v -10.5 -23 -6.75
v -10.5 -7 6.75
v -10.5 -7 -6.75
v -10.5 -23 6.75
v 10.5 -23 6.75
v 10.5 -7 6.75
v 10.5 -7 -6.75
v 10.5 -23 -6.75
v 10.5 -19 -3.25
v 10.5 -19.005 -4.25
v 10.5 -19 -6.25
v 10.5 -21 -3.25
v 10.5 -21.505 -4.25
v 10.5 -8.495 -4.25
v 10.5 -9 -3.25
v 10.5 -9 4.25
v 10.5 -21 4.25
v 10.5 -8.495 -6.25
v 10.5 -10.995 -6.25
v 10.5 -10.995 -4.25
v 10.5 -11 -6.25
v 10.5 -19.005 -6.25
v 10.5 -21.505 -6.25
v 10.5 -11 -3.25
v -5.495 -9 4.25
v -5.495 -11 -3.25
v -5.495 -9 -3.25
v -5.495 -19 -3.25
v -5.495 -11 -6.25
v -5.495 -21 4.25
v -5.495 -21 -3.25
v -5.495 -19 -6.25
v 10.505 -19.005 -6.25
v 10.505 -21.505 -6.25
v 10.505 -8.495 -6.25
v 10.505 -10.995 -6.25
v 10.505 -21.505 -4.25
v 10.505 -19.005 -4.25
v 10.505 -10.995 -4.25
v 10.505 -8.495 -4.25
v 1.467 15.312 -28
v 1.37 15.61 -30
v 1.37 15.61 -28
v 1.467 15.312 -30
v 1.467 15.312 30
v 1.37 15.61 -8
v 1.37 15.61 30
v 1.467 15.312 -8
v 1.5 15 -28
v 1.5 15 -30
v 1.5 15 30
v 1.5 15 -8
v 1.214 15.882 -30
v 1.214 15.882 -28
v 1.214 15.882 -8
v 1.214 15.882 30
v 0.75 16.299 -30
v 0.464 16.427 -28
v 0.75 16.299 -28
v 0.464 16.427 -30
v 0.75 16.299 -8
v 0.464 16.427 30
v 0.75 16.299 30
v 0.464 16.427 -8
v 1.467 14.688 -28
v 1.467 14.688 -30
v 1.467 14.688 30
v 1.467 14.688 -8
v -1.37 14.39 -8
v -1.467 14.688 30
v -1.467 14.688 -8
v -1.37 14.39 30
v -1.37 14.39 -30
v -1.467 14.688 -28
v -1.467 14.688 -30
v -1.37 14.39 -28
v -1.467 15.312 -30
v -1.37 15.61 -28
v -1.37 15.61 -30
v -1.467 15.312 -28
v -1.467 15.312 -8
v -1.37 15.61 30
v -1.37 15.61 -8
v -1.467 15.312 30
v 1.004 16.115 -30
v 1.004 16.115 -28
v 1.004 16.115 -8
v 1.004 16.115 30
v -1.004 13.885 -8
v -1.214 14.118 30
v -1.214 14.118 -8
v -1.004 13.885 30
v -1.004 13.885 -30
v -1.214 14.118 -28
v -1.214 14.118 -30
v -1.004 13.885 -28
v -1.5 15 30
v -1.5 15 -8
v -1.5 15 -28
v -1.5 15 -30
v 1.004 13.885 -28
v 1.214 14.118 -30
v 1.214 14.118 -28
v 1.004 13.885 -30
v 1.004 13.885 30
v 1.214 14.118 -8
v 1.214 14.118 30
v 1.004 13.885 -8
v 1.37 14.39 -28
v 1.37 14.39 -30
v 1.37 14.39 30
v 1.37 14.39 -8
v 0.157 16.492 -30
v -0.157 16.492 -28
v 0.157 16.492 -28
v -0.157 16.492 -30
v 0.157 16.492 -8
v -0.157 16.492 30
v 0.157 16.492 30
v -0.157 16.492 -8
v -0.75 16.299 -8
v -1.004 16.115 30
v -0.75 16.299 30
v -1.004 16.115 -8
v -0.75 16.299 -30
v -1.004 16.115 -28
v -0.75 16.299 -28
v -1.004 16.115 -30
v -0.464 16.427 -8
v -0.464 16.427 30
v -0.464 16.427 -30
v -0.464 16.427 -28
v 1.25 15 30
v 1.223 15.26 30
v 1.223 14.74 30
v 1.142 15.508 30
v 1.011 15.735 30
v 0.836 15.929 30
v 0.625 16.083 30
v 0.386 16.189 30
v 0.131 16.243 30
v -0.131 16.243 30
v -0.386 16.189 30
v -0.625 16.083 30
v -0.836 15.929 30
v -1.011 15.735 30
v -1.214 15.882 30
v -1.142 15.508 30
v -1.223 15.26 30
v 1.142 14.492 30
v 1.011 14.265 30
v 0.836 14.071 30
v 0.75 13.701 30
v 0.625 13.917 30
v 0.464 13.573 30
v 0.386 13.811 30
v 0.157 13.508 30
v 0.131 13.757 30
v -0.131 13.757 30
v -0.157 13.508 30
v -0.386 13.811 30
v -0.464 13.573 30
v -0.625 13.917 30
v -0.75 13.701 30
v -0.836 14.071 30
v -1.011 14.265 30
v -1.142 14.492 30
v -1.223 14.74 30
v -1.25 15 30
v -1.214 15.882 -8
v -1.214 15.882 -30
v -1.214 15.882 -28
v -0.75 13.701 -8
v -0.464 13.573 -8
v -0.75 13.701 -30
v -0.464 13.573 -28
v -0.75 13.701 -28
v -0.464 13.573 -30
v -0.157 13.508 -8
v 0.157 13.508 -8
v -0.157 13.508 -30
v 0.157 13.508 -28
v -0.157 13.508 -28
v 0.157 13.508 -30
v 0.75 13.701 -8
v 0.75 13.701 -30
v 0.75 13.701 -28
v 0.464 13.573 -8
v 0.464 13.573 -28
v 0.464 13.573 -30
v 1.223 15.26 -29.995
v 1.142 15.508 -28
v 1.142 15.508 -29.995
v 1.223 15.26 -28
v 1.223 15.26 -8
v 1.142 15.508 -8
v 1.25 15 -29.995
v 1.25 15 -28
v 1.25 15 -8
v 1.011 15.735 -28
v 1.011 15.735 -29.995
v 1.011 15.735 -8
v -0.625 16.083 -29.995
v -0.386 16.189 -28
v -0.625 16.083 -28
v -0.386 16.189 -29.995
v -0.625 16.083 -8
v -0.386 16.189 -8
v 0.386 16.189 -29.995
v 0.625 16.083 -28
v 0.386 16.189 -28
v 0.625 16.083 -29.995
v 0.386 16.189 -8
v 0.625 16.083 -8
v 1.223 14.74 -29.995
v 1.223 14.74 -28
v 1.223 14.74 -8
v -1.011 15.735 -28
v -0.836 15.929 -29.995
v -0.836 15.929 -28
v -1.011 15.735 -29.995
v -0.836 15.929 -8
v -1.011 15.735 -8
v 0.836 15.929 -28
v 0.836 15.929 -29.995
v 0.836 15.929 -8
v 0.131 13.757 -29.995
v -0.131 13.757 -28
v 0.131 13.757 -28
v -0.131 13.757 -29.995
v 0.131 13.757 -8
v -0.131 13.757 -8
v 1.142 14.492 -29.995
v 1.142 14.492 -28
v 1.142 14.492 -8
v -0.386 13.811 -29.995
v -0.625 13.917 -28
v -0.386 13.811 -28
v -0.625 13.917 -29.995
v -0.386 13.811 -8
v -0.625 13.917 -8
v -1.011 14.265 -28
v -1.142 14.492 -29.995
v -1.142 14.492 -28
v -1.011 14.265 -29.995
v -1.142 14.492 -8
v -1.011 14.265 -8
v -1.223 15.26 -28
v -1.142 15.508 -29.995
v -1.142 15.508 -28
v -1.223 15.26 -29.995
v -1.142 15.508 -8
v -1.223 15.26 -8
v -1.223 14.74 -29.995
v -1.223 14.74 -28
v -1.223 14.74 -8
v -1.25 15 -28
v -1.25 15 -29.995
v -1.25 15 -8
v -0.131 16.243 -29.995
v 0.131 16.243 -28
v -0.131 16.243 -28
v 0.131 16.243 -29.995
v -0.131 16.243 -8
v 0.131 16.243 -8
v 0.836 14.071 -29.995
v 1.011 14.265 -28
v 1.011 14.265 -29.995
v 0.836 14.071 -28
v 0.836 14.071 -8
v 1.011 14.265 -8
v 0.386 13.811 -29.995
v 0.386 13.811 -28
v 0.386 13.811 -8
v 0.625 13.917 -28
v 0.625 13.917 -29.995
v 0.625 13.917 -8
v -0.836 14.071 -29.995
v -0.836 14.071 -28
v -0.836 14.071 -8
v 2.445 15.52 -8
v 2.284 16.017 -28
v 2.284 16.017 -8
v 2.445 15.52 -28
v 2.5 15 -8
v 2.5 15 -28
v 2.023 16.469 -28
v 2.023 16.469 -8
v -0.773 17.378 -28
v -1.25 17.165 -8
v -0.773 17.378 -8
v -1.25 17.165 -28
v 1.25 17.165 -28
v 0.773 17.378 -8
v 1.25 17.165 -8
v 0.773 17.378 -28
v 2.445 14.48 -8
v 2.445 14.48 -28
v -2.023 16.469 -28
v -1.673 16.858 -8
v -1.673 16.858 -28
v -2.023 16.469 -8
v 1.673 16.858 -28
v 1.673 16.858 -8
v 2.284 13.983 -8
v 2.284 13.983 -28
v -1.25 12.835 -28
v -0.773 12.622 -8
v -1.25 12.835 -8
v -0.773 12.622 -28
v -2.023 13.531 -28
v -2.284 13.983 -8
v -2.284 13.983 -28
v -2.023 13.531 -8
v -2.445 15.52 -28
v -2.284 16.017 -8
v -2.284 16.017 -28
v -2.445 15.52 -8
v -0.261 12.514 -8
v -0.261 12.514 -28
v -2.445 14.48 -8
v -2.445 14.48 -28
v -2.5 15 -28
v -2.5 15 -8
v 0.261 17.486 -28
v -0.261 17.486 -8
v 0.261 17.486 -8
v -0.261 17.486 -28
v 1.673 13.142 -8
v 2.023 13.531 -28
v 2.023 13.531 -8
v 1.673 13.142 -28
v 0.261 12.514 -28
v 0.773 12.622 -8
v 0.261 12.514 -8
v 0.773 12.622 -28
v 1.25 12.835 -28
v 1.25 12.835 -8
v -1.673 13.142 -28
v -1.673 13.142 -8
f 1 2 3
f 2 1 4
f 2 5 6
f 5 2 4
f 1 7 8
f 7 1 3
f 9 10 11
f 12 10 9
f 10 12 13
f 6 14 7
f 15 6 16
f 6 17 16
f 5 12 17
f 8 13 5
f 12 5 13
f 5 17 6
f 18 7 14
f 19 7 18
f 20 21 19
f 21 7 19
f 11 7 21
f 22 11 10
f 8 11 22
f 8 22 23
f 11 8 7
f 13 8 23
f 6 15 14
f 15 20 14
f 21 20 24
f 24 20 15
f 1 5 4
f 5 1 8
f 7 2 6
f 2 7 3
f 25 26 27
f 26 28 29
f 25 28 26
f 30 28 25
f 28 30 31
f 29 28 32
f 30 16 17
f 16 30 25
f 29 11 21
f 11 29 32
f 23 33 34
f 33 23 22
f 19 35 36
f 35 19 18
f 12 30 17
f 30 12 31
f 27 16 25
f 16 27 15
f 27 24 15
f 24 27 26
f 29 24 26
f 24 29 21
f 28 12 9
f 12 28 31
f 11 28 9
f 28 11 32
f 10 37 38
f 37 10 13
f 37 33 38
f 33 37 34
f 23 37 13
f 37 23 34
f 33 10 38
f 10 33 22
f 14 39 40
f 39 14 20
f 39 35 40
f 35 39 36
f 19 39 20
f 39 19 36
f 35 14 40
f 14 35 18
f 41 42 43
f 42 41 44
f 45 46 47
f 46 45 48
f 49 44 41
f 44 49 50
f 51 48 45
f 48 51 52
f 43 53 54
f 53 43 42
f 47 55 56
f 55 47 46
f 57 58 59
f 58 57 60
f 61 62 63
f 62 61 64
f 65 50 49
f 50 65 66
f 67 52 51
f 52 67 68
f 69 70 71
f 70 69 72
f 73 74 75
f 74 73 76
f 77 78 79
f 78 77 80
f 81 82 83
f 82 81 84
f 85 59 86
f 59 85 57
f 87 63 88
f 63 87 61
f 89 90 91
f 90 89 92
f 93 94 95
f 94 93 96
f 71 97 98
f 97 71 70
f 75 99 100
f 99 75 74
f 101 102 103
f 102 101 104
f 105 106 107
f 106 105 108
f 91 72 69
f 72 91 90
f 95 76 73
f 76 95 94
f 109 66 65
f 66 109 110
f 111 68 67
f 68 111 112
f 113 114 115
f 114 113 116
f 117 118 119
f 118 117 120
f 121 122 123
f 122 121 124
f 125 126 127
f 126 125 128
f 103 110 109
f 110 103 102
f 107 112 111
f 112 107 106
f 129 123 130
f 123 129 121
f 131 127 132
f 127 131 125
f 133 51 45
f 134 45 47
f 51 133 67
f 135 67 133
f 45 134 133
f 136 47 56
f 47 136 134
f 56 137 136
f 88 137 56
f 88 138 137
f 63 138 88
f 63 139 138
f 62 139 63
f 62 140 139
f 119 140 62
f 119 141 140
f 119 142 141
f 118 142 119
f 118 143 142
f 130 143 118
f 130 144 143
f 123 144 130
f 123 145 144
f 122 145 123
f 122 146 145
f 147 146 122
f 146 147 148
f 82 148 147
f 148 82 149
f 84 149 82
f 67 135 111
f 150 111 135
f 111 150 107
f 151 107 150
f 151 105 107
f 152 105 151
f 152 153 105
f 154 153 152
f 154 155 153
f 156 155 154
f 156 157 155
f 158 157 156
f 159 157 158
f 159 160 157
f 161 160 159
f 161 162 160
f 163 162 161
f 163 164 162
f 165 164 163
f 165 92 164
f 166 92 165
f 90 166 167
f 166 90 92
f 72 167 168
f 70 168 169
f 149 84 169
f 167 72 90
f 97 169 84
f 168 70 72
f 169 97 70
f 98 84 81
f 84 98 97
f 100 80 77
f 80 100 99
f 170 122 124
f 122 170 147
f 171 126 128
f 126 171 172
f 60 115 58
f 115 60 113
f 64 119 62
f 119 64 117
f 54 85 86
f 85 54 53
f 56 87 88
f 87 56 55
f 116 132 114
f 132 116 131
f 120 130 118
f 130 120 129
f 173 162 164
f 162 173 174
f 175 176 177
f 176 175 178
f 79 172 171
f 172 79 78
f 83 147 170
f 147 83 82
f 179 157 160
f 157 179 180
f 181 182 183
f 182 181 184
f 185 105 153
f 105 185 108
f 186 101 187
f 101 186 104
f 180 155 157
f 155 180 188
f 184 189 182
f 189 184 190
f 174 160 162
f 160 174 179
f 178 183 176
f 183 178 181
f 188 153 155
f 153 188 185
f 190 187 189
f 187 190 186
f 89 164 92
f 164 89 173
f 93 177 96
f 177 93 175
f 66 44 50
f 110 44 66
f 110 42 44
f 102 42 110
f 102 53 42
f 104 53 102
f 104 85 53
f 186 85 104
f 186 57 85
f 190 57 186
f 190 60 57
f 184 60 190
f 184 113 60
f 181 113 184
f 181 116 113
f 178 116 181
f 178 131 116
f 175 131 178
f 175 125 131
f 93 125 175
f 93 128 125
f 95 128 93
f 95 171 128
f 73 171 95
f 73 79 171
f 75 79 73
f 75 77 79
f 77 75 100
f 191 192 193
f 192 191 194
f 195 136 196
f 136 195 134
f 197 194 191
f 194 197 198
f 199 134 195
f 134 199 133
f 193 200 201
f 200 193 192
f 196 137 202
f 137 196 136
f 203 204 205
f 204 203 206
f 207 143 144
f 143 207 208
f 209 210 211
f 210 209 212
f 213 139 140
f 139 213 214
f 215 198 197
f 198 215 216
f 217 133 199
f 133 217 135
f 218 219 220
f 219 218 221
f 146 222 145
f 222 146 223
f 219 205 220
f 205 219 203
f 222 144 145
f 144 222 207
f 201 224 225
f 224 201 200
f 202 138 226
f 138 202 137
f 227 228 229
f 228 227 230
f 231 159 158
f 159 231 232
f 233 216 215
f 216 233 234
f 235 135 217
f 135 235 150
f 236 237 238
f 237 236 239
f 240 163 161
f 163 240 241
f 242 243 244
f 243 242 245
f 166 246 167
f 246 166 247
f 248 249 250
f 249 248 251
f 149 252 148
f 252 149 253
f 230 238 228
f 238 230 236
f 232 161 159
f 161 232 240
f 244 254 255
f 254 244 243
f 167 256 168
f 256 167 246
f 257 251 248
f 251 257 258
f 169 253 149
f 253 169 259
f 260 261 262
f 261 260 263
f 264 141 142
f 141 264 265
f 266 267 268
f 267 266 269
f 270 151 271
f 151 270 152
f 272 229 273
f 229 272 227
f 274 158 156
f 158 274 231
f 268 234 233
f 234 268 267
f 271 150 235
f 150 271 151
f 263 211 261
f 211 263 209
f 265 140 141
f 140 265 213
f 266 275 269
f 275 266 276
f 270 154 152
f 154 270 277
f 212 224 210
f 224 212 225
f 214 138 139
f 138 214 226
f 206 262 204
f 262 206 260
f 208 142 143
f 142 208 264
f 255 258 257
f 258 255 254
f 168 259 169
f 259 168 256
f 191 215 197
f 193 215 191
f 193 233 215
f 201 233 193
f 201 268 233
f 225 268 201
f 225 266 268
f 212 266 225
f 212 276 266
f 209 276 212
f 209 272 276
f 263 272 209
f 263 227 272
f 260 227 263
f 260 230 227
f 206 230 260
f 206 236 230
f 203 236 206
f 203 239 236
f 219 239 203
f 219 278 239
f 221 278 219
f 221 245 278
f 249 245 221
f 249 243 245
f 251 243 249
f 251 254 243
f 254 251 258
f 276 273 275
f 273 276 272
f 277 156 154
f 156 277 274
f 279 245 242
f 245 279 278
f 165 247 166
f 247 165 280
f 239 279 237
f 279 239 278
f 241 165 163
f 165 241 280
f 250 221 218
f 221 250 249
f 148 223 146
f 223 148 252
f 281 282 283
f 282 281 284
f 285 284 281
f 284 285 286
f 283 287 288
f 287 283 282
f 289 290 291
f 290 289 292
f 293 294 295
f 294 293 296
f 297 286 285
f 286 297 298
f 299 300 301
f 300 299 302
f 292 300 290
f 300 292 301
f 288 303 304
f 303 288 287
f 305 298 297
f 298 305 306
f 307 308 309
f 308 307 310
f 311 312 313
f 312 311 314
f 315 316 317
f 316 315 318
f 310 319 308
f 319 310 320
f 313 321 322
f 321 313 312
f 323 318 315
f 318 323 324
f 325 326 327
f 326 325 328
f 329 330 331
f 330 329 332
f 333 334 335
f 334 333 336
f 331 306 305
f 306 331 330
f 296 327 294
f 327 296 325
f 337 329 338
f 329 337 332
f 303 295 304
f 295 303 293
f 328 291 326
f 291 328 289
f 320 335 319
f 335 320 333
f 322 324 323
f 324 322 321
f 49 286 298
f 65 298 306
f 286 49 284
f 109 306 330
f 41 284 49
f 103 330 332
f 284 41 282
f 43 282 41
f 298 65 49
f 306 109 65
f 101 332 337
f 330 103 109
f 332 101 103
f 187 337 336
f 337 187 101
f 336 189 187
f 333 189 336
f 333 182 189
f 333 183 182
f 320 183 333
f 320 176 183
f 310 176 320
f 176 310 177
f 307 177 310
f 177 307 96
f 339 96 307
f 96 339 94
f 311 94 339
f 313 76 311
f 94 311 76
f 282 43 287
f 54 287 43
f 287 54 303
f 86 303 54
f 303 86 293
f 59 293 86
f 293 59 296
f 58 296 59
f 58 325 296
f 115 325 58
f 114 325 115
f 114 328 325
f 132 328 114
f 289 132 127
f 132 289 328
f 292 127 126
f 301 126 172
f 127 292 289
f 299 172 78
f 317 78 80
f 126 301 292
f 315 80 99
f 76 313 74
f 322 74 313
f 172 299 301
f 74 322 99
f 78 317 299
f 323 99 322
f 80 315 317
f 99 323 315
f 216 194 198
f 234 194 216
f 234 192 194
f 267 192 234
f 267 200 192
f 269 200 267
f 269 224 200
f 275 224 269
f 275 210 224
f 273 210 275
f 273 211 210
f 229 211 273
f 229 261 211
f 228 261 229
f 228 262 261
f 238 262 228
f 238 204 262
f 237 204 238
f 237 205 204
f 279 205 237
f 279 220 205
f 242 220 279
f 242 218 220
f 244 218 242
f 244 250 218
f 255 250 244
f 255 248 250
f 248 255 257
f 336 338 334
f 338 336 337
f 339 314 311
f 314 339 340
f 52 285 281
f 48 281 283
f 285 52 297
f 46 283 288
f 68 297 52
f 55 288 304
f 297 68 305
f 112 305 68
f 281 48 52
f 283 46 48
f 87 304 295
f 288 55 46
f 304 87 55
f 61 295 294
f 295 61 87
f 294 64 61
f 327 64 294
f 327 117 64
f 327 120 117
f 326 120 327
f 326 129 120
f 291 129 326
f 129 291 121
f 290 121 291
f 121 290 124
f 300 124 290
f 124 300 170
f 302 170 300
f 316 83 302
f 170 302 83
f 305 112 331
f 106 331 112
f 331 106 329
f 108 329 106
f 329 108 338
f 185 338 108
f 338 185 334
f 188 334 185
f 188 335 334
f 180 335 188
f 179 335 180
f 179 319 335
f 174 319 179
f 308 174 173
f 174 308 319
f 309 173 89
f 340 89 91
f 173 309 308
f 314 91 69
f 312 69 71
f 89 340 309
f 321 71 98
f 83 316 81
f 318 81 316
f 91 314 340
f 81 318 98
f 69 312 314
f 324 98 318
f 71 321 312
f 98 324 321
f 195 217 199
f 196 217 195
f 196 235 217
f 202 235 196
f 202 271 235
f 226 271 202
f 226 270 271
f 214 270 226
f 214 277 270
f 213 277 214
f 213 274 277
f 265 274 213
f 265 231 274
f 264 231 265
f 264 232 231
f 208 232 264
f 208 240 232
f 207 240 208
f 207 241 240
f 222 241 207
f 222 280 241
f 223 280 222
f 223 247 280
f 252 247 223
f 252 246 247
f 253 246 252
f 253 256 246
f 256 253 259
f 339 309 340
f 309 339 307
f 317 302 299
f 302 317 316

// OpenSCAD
// file: ../globals.scad
// Copyright (c) 2017 Clément Bœsch <u pkh.me>
//
// Permission to use, copy, modify, and distribute this software for any
// purpose with or without fee is hereby granted, provided that the above
// copyright notice and this permission notice appear in all copies.
//
// THE SOFTWARE IS PROVIDED "AS IS" AND THE AUTHOR DISCLAIMS ALL WARRANTIES
// WITH REGARD TO THIS SOFTWARE INCLUDING ALL IMPLIED WARRANTIES OF
// MERCHANTABILITY AND FITNESS. IN NO EVENT SHALL THE AUTHOR BE LIABLE FOR
// ANY SPECIAL, DIRECT, INDIRECT, OR CONSEQUENTIAL DAMAGES OR ANY DAMAGES
// WHATSOEVER RESULTING FROM LOSS OF USE, DATA OR PROFITS, WHETHER IN AN
// ACTION OF CONTRACT, NEGLIGENCE OR OTHER TORTIOUS ACTION, ARISING OUT OF
// OR IN CONNECTION WITH THE USE OR PERFORMANCE OF THIS SOFTWARE.

$fn = 30;

_delta = 0.005;

c_black        = [.17,.17,.17];
c_black_redish = [.35,.30,.30];
c_gold         = [.75,.55,.00];
c_gray         = [.40,.40,.40];
c_darkgray     = [.25,.25,.25];
c_green_pcb    = [.00,.50,.25];
c_metal        = [.70,.70,.70];
c_yellow       = [.70,.70,.30];
c_darkblue     = [.20,.30,.40];
// file: _internal.scad
// Copyright (c) 2017 Clément Bœsch <u pkh.me>
//
// Permission to use, copy, modify, and distribute this software for any
// purpose with or without fee is hereby granted, provided that the above
// copyright notice and this permission notice appear in all copies.
//
// THE SOFTWARE IS PROVIDED "AS IS" AND THE AUTHOR DISCLAIMS ALL WARRANTIES
// WITH REGARD TO THIS SOFTWARE INCLUDING ALL IMPLIED WARRANTIES OF
// MERCHANTABILITY AND FITNESS. IN NO EVENT SHALL THE AUTHOR BE LIABLE FOR
// ANY SPECIAL, DIRECT, INDIRECT, OR CONSEQUENTIAL DAMAGES OR ANY DAMAGES
// WHATSOEVER RESULTING FROM LOSS OF USE, DATA OR PROFITS, WHETHER IN AN
// ACTION OF CONTRACT, NEGLIGENCE OR OTHER TORTIOUS ACTION, ARISING OUT OF
// OR IN CONNECTION WITH THE USE OR PERFORMANCE OF THIS SOFTWARE.

include <../globals.scad>

$vpr = [50, 0, 90];

module components_demo(pad=30) {
    n = $children;
    cols = ceil(sqrt(n));
    rows = ceil(n / cols);
    offx = pad * (rows - 1) / 2;
    offy = pad * (cols - 1) / 2;
    for (i = [0:n-1]) {
        x = floor(i / cols);
        y = i % cols;
        translate([x*pad - offx, y*pad - offy])
            rotate(360 * $t)
                children(i);
    }
}
// main file
// Copyright (c) 2017 Clément Bœsch <u pkh.me>
//
// Permission to use, copy, modify, and distribute this software for any
// purpose with or without fee is hereby granted, provided that the above
// copyright notice and this permission notice appear in all copies.
//
// THE SOFTWARE IS PROVIDED "AS IS" AND THE AUTHOR DISCLAIMS ALL WARRANTIES
// WITH REGARD TO THIS SOFTWARE INCLUDING ALL IMPLIED WARRANTIES OF
// MERCHANTABILITY AND FITNESS. IN NO EVENT SHALL THE AUTHOR BE LIABLE FOR
// ANY SPECIAL, DIRECT, INDIRECT, OR CONSEQUENTIAL DAMAGES OR ANY DAMAGES
// WHATSOEVER RESULTING FROM LOSS OF USE, DATA OR PROFITS, WHETHER IN AN
// ACTION OF CONTRACT, NEGLIGENCE OR OTHER TORTIOUS ACTION, ARISING OUT OF
// OR IN CONNECTION WITH THE USE OR PERFORMANCE OF THIS SOFTWARE.

include <_internal.scad>

$vpd = 180;

module antenna(dim=[5, 5, 60]) {
    color(c_black) {
        h_base = dim[2]/3;
        translate([0, 0, (h_base-dim[2])/2+2])
            cylinder(d=dim[0], h=dim[2]/3, center=true);
        difference() {
            cylinder(d=3, h=dim[2], center=true);
            translate([0, 0, _delta])
                cylinder(d=2.5, h=dim[2], center=true);
        }
    }
}

module ethernet(dim=[21, 16, 13.5], swap_led=false) {
    l = dim[0];
    w = dim[1];
    h = dim[2];

    c_green  = [.3, .9, .3];
    c_yellow = [.9, .9, .3];
    c1 = swap_led ? c_yellow : c_green;
    c2 = swap_led ? c_green  : c_yellow;

    rotate([0, 0, 180]) translate(dim * -.5) { // XXX
        difference() {
            color(c_metal)
                cube(dim);
            translate([-_delta, 2, 0.5])
                color(c_black)
                    cube([l-5, w-4, h-3]);
        }

        color(c_black)
            for (y = [2, w-4])
                translate([0, y, 0.5])
                    cube([l-1, 2, 3]);

        color(c1)
            translate([-_delta, w-4+_delta, .5])
                cube([1, 2.5, 2]);

        color(c2)
            translate([-_delta, 1.5-_delta, .5])
                cube([1, 2.5, 2]);
    }
}

function ethernet_info() = [
    ["category", "network"],
    ["watch", "horizon"],
];

function antenna_info() = [
    ["category", "network"],
    ["watch", "nowhere"],
];

components_demo() {
    ethernet();
    antenna();
}
